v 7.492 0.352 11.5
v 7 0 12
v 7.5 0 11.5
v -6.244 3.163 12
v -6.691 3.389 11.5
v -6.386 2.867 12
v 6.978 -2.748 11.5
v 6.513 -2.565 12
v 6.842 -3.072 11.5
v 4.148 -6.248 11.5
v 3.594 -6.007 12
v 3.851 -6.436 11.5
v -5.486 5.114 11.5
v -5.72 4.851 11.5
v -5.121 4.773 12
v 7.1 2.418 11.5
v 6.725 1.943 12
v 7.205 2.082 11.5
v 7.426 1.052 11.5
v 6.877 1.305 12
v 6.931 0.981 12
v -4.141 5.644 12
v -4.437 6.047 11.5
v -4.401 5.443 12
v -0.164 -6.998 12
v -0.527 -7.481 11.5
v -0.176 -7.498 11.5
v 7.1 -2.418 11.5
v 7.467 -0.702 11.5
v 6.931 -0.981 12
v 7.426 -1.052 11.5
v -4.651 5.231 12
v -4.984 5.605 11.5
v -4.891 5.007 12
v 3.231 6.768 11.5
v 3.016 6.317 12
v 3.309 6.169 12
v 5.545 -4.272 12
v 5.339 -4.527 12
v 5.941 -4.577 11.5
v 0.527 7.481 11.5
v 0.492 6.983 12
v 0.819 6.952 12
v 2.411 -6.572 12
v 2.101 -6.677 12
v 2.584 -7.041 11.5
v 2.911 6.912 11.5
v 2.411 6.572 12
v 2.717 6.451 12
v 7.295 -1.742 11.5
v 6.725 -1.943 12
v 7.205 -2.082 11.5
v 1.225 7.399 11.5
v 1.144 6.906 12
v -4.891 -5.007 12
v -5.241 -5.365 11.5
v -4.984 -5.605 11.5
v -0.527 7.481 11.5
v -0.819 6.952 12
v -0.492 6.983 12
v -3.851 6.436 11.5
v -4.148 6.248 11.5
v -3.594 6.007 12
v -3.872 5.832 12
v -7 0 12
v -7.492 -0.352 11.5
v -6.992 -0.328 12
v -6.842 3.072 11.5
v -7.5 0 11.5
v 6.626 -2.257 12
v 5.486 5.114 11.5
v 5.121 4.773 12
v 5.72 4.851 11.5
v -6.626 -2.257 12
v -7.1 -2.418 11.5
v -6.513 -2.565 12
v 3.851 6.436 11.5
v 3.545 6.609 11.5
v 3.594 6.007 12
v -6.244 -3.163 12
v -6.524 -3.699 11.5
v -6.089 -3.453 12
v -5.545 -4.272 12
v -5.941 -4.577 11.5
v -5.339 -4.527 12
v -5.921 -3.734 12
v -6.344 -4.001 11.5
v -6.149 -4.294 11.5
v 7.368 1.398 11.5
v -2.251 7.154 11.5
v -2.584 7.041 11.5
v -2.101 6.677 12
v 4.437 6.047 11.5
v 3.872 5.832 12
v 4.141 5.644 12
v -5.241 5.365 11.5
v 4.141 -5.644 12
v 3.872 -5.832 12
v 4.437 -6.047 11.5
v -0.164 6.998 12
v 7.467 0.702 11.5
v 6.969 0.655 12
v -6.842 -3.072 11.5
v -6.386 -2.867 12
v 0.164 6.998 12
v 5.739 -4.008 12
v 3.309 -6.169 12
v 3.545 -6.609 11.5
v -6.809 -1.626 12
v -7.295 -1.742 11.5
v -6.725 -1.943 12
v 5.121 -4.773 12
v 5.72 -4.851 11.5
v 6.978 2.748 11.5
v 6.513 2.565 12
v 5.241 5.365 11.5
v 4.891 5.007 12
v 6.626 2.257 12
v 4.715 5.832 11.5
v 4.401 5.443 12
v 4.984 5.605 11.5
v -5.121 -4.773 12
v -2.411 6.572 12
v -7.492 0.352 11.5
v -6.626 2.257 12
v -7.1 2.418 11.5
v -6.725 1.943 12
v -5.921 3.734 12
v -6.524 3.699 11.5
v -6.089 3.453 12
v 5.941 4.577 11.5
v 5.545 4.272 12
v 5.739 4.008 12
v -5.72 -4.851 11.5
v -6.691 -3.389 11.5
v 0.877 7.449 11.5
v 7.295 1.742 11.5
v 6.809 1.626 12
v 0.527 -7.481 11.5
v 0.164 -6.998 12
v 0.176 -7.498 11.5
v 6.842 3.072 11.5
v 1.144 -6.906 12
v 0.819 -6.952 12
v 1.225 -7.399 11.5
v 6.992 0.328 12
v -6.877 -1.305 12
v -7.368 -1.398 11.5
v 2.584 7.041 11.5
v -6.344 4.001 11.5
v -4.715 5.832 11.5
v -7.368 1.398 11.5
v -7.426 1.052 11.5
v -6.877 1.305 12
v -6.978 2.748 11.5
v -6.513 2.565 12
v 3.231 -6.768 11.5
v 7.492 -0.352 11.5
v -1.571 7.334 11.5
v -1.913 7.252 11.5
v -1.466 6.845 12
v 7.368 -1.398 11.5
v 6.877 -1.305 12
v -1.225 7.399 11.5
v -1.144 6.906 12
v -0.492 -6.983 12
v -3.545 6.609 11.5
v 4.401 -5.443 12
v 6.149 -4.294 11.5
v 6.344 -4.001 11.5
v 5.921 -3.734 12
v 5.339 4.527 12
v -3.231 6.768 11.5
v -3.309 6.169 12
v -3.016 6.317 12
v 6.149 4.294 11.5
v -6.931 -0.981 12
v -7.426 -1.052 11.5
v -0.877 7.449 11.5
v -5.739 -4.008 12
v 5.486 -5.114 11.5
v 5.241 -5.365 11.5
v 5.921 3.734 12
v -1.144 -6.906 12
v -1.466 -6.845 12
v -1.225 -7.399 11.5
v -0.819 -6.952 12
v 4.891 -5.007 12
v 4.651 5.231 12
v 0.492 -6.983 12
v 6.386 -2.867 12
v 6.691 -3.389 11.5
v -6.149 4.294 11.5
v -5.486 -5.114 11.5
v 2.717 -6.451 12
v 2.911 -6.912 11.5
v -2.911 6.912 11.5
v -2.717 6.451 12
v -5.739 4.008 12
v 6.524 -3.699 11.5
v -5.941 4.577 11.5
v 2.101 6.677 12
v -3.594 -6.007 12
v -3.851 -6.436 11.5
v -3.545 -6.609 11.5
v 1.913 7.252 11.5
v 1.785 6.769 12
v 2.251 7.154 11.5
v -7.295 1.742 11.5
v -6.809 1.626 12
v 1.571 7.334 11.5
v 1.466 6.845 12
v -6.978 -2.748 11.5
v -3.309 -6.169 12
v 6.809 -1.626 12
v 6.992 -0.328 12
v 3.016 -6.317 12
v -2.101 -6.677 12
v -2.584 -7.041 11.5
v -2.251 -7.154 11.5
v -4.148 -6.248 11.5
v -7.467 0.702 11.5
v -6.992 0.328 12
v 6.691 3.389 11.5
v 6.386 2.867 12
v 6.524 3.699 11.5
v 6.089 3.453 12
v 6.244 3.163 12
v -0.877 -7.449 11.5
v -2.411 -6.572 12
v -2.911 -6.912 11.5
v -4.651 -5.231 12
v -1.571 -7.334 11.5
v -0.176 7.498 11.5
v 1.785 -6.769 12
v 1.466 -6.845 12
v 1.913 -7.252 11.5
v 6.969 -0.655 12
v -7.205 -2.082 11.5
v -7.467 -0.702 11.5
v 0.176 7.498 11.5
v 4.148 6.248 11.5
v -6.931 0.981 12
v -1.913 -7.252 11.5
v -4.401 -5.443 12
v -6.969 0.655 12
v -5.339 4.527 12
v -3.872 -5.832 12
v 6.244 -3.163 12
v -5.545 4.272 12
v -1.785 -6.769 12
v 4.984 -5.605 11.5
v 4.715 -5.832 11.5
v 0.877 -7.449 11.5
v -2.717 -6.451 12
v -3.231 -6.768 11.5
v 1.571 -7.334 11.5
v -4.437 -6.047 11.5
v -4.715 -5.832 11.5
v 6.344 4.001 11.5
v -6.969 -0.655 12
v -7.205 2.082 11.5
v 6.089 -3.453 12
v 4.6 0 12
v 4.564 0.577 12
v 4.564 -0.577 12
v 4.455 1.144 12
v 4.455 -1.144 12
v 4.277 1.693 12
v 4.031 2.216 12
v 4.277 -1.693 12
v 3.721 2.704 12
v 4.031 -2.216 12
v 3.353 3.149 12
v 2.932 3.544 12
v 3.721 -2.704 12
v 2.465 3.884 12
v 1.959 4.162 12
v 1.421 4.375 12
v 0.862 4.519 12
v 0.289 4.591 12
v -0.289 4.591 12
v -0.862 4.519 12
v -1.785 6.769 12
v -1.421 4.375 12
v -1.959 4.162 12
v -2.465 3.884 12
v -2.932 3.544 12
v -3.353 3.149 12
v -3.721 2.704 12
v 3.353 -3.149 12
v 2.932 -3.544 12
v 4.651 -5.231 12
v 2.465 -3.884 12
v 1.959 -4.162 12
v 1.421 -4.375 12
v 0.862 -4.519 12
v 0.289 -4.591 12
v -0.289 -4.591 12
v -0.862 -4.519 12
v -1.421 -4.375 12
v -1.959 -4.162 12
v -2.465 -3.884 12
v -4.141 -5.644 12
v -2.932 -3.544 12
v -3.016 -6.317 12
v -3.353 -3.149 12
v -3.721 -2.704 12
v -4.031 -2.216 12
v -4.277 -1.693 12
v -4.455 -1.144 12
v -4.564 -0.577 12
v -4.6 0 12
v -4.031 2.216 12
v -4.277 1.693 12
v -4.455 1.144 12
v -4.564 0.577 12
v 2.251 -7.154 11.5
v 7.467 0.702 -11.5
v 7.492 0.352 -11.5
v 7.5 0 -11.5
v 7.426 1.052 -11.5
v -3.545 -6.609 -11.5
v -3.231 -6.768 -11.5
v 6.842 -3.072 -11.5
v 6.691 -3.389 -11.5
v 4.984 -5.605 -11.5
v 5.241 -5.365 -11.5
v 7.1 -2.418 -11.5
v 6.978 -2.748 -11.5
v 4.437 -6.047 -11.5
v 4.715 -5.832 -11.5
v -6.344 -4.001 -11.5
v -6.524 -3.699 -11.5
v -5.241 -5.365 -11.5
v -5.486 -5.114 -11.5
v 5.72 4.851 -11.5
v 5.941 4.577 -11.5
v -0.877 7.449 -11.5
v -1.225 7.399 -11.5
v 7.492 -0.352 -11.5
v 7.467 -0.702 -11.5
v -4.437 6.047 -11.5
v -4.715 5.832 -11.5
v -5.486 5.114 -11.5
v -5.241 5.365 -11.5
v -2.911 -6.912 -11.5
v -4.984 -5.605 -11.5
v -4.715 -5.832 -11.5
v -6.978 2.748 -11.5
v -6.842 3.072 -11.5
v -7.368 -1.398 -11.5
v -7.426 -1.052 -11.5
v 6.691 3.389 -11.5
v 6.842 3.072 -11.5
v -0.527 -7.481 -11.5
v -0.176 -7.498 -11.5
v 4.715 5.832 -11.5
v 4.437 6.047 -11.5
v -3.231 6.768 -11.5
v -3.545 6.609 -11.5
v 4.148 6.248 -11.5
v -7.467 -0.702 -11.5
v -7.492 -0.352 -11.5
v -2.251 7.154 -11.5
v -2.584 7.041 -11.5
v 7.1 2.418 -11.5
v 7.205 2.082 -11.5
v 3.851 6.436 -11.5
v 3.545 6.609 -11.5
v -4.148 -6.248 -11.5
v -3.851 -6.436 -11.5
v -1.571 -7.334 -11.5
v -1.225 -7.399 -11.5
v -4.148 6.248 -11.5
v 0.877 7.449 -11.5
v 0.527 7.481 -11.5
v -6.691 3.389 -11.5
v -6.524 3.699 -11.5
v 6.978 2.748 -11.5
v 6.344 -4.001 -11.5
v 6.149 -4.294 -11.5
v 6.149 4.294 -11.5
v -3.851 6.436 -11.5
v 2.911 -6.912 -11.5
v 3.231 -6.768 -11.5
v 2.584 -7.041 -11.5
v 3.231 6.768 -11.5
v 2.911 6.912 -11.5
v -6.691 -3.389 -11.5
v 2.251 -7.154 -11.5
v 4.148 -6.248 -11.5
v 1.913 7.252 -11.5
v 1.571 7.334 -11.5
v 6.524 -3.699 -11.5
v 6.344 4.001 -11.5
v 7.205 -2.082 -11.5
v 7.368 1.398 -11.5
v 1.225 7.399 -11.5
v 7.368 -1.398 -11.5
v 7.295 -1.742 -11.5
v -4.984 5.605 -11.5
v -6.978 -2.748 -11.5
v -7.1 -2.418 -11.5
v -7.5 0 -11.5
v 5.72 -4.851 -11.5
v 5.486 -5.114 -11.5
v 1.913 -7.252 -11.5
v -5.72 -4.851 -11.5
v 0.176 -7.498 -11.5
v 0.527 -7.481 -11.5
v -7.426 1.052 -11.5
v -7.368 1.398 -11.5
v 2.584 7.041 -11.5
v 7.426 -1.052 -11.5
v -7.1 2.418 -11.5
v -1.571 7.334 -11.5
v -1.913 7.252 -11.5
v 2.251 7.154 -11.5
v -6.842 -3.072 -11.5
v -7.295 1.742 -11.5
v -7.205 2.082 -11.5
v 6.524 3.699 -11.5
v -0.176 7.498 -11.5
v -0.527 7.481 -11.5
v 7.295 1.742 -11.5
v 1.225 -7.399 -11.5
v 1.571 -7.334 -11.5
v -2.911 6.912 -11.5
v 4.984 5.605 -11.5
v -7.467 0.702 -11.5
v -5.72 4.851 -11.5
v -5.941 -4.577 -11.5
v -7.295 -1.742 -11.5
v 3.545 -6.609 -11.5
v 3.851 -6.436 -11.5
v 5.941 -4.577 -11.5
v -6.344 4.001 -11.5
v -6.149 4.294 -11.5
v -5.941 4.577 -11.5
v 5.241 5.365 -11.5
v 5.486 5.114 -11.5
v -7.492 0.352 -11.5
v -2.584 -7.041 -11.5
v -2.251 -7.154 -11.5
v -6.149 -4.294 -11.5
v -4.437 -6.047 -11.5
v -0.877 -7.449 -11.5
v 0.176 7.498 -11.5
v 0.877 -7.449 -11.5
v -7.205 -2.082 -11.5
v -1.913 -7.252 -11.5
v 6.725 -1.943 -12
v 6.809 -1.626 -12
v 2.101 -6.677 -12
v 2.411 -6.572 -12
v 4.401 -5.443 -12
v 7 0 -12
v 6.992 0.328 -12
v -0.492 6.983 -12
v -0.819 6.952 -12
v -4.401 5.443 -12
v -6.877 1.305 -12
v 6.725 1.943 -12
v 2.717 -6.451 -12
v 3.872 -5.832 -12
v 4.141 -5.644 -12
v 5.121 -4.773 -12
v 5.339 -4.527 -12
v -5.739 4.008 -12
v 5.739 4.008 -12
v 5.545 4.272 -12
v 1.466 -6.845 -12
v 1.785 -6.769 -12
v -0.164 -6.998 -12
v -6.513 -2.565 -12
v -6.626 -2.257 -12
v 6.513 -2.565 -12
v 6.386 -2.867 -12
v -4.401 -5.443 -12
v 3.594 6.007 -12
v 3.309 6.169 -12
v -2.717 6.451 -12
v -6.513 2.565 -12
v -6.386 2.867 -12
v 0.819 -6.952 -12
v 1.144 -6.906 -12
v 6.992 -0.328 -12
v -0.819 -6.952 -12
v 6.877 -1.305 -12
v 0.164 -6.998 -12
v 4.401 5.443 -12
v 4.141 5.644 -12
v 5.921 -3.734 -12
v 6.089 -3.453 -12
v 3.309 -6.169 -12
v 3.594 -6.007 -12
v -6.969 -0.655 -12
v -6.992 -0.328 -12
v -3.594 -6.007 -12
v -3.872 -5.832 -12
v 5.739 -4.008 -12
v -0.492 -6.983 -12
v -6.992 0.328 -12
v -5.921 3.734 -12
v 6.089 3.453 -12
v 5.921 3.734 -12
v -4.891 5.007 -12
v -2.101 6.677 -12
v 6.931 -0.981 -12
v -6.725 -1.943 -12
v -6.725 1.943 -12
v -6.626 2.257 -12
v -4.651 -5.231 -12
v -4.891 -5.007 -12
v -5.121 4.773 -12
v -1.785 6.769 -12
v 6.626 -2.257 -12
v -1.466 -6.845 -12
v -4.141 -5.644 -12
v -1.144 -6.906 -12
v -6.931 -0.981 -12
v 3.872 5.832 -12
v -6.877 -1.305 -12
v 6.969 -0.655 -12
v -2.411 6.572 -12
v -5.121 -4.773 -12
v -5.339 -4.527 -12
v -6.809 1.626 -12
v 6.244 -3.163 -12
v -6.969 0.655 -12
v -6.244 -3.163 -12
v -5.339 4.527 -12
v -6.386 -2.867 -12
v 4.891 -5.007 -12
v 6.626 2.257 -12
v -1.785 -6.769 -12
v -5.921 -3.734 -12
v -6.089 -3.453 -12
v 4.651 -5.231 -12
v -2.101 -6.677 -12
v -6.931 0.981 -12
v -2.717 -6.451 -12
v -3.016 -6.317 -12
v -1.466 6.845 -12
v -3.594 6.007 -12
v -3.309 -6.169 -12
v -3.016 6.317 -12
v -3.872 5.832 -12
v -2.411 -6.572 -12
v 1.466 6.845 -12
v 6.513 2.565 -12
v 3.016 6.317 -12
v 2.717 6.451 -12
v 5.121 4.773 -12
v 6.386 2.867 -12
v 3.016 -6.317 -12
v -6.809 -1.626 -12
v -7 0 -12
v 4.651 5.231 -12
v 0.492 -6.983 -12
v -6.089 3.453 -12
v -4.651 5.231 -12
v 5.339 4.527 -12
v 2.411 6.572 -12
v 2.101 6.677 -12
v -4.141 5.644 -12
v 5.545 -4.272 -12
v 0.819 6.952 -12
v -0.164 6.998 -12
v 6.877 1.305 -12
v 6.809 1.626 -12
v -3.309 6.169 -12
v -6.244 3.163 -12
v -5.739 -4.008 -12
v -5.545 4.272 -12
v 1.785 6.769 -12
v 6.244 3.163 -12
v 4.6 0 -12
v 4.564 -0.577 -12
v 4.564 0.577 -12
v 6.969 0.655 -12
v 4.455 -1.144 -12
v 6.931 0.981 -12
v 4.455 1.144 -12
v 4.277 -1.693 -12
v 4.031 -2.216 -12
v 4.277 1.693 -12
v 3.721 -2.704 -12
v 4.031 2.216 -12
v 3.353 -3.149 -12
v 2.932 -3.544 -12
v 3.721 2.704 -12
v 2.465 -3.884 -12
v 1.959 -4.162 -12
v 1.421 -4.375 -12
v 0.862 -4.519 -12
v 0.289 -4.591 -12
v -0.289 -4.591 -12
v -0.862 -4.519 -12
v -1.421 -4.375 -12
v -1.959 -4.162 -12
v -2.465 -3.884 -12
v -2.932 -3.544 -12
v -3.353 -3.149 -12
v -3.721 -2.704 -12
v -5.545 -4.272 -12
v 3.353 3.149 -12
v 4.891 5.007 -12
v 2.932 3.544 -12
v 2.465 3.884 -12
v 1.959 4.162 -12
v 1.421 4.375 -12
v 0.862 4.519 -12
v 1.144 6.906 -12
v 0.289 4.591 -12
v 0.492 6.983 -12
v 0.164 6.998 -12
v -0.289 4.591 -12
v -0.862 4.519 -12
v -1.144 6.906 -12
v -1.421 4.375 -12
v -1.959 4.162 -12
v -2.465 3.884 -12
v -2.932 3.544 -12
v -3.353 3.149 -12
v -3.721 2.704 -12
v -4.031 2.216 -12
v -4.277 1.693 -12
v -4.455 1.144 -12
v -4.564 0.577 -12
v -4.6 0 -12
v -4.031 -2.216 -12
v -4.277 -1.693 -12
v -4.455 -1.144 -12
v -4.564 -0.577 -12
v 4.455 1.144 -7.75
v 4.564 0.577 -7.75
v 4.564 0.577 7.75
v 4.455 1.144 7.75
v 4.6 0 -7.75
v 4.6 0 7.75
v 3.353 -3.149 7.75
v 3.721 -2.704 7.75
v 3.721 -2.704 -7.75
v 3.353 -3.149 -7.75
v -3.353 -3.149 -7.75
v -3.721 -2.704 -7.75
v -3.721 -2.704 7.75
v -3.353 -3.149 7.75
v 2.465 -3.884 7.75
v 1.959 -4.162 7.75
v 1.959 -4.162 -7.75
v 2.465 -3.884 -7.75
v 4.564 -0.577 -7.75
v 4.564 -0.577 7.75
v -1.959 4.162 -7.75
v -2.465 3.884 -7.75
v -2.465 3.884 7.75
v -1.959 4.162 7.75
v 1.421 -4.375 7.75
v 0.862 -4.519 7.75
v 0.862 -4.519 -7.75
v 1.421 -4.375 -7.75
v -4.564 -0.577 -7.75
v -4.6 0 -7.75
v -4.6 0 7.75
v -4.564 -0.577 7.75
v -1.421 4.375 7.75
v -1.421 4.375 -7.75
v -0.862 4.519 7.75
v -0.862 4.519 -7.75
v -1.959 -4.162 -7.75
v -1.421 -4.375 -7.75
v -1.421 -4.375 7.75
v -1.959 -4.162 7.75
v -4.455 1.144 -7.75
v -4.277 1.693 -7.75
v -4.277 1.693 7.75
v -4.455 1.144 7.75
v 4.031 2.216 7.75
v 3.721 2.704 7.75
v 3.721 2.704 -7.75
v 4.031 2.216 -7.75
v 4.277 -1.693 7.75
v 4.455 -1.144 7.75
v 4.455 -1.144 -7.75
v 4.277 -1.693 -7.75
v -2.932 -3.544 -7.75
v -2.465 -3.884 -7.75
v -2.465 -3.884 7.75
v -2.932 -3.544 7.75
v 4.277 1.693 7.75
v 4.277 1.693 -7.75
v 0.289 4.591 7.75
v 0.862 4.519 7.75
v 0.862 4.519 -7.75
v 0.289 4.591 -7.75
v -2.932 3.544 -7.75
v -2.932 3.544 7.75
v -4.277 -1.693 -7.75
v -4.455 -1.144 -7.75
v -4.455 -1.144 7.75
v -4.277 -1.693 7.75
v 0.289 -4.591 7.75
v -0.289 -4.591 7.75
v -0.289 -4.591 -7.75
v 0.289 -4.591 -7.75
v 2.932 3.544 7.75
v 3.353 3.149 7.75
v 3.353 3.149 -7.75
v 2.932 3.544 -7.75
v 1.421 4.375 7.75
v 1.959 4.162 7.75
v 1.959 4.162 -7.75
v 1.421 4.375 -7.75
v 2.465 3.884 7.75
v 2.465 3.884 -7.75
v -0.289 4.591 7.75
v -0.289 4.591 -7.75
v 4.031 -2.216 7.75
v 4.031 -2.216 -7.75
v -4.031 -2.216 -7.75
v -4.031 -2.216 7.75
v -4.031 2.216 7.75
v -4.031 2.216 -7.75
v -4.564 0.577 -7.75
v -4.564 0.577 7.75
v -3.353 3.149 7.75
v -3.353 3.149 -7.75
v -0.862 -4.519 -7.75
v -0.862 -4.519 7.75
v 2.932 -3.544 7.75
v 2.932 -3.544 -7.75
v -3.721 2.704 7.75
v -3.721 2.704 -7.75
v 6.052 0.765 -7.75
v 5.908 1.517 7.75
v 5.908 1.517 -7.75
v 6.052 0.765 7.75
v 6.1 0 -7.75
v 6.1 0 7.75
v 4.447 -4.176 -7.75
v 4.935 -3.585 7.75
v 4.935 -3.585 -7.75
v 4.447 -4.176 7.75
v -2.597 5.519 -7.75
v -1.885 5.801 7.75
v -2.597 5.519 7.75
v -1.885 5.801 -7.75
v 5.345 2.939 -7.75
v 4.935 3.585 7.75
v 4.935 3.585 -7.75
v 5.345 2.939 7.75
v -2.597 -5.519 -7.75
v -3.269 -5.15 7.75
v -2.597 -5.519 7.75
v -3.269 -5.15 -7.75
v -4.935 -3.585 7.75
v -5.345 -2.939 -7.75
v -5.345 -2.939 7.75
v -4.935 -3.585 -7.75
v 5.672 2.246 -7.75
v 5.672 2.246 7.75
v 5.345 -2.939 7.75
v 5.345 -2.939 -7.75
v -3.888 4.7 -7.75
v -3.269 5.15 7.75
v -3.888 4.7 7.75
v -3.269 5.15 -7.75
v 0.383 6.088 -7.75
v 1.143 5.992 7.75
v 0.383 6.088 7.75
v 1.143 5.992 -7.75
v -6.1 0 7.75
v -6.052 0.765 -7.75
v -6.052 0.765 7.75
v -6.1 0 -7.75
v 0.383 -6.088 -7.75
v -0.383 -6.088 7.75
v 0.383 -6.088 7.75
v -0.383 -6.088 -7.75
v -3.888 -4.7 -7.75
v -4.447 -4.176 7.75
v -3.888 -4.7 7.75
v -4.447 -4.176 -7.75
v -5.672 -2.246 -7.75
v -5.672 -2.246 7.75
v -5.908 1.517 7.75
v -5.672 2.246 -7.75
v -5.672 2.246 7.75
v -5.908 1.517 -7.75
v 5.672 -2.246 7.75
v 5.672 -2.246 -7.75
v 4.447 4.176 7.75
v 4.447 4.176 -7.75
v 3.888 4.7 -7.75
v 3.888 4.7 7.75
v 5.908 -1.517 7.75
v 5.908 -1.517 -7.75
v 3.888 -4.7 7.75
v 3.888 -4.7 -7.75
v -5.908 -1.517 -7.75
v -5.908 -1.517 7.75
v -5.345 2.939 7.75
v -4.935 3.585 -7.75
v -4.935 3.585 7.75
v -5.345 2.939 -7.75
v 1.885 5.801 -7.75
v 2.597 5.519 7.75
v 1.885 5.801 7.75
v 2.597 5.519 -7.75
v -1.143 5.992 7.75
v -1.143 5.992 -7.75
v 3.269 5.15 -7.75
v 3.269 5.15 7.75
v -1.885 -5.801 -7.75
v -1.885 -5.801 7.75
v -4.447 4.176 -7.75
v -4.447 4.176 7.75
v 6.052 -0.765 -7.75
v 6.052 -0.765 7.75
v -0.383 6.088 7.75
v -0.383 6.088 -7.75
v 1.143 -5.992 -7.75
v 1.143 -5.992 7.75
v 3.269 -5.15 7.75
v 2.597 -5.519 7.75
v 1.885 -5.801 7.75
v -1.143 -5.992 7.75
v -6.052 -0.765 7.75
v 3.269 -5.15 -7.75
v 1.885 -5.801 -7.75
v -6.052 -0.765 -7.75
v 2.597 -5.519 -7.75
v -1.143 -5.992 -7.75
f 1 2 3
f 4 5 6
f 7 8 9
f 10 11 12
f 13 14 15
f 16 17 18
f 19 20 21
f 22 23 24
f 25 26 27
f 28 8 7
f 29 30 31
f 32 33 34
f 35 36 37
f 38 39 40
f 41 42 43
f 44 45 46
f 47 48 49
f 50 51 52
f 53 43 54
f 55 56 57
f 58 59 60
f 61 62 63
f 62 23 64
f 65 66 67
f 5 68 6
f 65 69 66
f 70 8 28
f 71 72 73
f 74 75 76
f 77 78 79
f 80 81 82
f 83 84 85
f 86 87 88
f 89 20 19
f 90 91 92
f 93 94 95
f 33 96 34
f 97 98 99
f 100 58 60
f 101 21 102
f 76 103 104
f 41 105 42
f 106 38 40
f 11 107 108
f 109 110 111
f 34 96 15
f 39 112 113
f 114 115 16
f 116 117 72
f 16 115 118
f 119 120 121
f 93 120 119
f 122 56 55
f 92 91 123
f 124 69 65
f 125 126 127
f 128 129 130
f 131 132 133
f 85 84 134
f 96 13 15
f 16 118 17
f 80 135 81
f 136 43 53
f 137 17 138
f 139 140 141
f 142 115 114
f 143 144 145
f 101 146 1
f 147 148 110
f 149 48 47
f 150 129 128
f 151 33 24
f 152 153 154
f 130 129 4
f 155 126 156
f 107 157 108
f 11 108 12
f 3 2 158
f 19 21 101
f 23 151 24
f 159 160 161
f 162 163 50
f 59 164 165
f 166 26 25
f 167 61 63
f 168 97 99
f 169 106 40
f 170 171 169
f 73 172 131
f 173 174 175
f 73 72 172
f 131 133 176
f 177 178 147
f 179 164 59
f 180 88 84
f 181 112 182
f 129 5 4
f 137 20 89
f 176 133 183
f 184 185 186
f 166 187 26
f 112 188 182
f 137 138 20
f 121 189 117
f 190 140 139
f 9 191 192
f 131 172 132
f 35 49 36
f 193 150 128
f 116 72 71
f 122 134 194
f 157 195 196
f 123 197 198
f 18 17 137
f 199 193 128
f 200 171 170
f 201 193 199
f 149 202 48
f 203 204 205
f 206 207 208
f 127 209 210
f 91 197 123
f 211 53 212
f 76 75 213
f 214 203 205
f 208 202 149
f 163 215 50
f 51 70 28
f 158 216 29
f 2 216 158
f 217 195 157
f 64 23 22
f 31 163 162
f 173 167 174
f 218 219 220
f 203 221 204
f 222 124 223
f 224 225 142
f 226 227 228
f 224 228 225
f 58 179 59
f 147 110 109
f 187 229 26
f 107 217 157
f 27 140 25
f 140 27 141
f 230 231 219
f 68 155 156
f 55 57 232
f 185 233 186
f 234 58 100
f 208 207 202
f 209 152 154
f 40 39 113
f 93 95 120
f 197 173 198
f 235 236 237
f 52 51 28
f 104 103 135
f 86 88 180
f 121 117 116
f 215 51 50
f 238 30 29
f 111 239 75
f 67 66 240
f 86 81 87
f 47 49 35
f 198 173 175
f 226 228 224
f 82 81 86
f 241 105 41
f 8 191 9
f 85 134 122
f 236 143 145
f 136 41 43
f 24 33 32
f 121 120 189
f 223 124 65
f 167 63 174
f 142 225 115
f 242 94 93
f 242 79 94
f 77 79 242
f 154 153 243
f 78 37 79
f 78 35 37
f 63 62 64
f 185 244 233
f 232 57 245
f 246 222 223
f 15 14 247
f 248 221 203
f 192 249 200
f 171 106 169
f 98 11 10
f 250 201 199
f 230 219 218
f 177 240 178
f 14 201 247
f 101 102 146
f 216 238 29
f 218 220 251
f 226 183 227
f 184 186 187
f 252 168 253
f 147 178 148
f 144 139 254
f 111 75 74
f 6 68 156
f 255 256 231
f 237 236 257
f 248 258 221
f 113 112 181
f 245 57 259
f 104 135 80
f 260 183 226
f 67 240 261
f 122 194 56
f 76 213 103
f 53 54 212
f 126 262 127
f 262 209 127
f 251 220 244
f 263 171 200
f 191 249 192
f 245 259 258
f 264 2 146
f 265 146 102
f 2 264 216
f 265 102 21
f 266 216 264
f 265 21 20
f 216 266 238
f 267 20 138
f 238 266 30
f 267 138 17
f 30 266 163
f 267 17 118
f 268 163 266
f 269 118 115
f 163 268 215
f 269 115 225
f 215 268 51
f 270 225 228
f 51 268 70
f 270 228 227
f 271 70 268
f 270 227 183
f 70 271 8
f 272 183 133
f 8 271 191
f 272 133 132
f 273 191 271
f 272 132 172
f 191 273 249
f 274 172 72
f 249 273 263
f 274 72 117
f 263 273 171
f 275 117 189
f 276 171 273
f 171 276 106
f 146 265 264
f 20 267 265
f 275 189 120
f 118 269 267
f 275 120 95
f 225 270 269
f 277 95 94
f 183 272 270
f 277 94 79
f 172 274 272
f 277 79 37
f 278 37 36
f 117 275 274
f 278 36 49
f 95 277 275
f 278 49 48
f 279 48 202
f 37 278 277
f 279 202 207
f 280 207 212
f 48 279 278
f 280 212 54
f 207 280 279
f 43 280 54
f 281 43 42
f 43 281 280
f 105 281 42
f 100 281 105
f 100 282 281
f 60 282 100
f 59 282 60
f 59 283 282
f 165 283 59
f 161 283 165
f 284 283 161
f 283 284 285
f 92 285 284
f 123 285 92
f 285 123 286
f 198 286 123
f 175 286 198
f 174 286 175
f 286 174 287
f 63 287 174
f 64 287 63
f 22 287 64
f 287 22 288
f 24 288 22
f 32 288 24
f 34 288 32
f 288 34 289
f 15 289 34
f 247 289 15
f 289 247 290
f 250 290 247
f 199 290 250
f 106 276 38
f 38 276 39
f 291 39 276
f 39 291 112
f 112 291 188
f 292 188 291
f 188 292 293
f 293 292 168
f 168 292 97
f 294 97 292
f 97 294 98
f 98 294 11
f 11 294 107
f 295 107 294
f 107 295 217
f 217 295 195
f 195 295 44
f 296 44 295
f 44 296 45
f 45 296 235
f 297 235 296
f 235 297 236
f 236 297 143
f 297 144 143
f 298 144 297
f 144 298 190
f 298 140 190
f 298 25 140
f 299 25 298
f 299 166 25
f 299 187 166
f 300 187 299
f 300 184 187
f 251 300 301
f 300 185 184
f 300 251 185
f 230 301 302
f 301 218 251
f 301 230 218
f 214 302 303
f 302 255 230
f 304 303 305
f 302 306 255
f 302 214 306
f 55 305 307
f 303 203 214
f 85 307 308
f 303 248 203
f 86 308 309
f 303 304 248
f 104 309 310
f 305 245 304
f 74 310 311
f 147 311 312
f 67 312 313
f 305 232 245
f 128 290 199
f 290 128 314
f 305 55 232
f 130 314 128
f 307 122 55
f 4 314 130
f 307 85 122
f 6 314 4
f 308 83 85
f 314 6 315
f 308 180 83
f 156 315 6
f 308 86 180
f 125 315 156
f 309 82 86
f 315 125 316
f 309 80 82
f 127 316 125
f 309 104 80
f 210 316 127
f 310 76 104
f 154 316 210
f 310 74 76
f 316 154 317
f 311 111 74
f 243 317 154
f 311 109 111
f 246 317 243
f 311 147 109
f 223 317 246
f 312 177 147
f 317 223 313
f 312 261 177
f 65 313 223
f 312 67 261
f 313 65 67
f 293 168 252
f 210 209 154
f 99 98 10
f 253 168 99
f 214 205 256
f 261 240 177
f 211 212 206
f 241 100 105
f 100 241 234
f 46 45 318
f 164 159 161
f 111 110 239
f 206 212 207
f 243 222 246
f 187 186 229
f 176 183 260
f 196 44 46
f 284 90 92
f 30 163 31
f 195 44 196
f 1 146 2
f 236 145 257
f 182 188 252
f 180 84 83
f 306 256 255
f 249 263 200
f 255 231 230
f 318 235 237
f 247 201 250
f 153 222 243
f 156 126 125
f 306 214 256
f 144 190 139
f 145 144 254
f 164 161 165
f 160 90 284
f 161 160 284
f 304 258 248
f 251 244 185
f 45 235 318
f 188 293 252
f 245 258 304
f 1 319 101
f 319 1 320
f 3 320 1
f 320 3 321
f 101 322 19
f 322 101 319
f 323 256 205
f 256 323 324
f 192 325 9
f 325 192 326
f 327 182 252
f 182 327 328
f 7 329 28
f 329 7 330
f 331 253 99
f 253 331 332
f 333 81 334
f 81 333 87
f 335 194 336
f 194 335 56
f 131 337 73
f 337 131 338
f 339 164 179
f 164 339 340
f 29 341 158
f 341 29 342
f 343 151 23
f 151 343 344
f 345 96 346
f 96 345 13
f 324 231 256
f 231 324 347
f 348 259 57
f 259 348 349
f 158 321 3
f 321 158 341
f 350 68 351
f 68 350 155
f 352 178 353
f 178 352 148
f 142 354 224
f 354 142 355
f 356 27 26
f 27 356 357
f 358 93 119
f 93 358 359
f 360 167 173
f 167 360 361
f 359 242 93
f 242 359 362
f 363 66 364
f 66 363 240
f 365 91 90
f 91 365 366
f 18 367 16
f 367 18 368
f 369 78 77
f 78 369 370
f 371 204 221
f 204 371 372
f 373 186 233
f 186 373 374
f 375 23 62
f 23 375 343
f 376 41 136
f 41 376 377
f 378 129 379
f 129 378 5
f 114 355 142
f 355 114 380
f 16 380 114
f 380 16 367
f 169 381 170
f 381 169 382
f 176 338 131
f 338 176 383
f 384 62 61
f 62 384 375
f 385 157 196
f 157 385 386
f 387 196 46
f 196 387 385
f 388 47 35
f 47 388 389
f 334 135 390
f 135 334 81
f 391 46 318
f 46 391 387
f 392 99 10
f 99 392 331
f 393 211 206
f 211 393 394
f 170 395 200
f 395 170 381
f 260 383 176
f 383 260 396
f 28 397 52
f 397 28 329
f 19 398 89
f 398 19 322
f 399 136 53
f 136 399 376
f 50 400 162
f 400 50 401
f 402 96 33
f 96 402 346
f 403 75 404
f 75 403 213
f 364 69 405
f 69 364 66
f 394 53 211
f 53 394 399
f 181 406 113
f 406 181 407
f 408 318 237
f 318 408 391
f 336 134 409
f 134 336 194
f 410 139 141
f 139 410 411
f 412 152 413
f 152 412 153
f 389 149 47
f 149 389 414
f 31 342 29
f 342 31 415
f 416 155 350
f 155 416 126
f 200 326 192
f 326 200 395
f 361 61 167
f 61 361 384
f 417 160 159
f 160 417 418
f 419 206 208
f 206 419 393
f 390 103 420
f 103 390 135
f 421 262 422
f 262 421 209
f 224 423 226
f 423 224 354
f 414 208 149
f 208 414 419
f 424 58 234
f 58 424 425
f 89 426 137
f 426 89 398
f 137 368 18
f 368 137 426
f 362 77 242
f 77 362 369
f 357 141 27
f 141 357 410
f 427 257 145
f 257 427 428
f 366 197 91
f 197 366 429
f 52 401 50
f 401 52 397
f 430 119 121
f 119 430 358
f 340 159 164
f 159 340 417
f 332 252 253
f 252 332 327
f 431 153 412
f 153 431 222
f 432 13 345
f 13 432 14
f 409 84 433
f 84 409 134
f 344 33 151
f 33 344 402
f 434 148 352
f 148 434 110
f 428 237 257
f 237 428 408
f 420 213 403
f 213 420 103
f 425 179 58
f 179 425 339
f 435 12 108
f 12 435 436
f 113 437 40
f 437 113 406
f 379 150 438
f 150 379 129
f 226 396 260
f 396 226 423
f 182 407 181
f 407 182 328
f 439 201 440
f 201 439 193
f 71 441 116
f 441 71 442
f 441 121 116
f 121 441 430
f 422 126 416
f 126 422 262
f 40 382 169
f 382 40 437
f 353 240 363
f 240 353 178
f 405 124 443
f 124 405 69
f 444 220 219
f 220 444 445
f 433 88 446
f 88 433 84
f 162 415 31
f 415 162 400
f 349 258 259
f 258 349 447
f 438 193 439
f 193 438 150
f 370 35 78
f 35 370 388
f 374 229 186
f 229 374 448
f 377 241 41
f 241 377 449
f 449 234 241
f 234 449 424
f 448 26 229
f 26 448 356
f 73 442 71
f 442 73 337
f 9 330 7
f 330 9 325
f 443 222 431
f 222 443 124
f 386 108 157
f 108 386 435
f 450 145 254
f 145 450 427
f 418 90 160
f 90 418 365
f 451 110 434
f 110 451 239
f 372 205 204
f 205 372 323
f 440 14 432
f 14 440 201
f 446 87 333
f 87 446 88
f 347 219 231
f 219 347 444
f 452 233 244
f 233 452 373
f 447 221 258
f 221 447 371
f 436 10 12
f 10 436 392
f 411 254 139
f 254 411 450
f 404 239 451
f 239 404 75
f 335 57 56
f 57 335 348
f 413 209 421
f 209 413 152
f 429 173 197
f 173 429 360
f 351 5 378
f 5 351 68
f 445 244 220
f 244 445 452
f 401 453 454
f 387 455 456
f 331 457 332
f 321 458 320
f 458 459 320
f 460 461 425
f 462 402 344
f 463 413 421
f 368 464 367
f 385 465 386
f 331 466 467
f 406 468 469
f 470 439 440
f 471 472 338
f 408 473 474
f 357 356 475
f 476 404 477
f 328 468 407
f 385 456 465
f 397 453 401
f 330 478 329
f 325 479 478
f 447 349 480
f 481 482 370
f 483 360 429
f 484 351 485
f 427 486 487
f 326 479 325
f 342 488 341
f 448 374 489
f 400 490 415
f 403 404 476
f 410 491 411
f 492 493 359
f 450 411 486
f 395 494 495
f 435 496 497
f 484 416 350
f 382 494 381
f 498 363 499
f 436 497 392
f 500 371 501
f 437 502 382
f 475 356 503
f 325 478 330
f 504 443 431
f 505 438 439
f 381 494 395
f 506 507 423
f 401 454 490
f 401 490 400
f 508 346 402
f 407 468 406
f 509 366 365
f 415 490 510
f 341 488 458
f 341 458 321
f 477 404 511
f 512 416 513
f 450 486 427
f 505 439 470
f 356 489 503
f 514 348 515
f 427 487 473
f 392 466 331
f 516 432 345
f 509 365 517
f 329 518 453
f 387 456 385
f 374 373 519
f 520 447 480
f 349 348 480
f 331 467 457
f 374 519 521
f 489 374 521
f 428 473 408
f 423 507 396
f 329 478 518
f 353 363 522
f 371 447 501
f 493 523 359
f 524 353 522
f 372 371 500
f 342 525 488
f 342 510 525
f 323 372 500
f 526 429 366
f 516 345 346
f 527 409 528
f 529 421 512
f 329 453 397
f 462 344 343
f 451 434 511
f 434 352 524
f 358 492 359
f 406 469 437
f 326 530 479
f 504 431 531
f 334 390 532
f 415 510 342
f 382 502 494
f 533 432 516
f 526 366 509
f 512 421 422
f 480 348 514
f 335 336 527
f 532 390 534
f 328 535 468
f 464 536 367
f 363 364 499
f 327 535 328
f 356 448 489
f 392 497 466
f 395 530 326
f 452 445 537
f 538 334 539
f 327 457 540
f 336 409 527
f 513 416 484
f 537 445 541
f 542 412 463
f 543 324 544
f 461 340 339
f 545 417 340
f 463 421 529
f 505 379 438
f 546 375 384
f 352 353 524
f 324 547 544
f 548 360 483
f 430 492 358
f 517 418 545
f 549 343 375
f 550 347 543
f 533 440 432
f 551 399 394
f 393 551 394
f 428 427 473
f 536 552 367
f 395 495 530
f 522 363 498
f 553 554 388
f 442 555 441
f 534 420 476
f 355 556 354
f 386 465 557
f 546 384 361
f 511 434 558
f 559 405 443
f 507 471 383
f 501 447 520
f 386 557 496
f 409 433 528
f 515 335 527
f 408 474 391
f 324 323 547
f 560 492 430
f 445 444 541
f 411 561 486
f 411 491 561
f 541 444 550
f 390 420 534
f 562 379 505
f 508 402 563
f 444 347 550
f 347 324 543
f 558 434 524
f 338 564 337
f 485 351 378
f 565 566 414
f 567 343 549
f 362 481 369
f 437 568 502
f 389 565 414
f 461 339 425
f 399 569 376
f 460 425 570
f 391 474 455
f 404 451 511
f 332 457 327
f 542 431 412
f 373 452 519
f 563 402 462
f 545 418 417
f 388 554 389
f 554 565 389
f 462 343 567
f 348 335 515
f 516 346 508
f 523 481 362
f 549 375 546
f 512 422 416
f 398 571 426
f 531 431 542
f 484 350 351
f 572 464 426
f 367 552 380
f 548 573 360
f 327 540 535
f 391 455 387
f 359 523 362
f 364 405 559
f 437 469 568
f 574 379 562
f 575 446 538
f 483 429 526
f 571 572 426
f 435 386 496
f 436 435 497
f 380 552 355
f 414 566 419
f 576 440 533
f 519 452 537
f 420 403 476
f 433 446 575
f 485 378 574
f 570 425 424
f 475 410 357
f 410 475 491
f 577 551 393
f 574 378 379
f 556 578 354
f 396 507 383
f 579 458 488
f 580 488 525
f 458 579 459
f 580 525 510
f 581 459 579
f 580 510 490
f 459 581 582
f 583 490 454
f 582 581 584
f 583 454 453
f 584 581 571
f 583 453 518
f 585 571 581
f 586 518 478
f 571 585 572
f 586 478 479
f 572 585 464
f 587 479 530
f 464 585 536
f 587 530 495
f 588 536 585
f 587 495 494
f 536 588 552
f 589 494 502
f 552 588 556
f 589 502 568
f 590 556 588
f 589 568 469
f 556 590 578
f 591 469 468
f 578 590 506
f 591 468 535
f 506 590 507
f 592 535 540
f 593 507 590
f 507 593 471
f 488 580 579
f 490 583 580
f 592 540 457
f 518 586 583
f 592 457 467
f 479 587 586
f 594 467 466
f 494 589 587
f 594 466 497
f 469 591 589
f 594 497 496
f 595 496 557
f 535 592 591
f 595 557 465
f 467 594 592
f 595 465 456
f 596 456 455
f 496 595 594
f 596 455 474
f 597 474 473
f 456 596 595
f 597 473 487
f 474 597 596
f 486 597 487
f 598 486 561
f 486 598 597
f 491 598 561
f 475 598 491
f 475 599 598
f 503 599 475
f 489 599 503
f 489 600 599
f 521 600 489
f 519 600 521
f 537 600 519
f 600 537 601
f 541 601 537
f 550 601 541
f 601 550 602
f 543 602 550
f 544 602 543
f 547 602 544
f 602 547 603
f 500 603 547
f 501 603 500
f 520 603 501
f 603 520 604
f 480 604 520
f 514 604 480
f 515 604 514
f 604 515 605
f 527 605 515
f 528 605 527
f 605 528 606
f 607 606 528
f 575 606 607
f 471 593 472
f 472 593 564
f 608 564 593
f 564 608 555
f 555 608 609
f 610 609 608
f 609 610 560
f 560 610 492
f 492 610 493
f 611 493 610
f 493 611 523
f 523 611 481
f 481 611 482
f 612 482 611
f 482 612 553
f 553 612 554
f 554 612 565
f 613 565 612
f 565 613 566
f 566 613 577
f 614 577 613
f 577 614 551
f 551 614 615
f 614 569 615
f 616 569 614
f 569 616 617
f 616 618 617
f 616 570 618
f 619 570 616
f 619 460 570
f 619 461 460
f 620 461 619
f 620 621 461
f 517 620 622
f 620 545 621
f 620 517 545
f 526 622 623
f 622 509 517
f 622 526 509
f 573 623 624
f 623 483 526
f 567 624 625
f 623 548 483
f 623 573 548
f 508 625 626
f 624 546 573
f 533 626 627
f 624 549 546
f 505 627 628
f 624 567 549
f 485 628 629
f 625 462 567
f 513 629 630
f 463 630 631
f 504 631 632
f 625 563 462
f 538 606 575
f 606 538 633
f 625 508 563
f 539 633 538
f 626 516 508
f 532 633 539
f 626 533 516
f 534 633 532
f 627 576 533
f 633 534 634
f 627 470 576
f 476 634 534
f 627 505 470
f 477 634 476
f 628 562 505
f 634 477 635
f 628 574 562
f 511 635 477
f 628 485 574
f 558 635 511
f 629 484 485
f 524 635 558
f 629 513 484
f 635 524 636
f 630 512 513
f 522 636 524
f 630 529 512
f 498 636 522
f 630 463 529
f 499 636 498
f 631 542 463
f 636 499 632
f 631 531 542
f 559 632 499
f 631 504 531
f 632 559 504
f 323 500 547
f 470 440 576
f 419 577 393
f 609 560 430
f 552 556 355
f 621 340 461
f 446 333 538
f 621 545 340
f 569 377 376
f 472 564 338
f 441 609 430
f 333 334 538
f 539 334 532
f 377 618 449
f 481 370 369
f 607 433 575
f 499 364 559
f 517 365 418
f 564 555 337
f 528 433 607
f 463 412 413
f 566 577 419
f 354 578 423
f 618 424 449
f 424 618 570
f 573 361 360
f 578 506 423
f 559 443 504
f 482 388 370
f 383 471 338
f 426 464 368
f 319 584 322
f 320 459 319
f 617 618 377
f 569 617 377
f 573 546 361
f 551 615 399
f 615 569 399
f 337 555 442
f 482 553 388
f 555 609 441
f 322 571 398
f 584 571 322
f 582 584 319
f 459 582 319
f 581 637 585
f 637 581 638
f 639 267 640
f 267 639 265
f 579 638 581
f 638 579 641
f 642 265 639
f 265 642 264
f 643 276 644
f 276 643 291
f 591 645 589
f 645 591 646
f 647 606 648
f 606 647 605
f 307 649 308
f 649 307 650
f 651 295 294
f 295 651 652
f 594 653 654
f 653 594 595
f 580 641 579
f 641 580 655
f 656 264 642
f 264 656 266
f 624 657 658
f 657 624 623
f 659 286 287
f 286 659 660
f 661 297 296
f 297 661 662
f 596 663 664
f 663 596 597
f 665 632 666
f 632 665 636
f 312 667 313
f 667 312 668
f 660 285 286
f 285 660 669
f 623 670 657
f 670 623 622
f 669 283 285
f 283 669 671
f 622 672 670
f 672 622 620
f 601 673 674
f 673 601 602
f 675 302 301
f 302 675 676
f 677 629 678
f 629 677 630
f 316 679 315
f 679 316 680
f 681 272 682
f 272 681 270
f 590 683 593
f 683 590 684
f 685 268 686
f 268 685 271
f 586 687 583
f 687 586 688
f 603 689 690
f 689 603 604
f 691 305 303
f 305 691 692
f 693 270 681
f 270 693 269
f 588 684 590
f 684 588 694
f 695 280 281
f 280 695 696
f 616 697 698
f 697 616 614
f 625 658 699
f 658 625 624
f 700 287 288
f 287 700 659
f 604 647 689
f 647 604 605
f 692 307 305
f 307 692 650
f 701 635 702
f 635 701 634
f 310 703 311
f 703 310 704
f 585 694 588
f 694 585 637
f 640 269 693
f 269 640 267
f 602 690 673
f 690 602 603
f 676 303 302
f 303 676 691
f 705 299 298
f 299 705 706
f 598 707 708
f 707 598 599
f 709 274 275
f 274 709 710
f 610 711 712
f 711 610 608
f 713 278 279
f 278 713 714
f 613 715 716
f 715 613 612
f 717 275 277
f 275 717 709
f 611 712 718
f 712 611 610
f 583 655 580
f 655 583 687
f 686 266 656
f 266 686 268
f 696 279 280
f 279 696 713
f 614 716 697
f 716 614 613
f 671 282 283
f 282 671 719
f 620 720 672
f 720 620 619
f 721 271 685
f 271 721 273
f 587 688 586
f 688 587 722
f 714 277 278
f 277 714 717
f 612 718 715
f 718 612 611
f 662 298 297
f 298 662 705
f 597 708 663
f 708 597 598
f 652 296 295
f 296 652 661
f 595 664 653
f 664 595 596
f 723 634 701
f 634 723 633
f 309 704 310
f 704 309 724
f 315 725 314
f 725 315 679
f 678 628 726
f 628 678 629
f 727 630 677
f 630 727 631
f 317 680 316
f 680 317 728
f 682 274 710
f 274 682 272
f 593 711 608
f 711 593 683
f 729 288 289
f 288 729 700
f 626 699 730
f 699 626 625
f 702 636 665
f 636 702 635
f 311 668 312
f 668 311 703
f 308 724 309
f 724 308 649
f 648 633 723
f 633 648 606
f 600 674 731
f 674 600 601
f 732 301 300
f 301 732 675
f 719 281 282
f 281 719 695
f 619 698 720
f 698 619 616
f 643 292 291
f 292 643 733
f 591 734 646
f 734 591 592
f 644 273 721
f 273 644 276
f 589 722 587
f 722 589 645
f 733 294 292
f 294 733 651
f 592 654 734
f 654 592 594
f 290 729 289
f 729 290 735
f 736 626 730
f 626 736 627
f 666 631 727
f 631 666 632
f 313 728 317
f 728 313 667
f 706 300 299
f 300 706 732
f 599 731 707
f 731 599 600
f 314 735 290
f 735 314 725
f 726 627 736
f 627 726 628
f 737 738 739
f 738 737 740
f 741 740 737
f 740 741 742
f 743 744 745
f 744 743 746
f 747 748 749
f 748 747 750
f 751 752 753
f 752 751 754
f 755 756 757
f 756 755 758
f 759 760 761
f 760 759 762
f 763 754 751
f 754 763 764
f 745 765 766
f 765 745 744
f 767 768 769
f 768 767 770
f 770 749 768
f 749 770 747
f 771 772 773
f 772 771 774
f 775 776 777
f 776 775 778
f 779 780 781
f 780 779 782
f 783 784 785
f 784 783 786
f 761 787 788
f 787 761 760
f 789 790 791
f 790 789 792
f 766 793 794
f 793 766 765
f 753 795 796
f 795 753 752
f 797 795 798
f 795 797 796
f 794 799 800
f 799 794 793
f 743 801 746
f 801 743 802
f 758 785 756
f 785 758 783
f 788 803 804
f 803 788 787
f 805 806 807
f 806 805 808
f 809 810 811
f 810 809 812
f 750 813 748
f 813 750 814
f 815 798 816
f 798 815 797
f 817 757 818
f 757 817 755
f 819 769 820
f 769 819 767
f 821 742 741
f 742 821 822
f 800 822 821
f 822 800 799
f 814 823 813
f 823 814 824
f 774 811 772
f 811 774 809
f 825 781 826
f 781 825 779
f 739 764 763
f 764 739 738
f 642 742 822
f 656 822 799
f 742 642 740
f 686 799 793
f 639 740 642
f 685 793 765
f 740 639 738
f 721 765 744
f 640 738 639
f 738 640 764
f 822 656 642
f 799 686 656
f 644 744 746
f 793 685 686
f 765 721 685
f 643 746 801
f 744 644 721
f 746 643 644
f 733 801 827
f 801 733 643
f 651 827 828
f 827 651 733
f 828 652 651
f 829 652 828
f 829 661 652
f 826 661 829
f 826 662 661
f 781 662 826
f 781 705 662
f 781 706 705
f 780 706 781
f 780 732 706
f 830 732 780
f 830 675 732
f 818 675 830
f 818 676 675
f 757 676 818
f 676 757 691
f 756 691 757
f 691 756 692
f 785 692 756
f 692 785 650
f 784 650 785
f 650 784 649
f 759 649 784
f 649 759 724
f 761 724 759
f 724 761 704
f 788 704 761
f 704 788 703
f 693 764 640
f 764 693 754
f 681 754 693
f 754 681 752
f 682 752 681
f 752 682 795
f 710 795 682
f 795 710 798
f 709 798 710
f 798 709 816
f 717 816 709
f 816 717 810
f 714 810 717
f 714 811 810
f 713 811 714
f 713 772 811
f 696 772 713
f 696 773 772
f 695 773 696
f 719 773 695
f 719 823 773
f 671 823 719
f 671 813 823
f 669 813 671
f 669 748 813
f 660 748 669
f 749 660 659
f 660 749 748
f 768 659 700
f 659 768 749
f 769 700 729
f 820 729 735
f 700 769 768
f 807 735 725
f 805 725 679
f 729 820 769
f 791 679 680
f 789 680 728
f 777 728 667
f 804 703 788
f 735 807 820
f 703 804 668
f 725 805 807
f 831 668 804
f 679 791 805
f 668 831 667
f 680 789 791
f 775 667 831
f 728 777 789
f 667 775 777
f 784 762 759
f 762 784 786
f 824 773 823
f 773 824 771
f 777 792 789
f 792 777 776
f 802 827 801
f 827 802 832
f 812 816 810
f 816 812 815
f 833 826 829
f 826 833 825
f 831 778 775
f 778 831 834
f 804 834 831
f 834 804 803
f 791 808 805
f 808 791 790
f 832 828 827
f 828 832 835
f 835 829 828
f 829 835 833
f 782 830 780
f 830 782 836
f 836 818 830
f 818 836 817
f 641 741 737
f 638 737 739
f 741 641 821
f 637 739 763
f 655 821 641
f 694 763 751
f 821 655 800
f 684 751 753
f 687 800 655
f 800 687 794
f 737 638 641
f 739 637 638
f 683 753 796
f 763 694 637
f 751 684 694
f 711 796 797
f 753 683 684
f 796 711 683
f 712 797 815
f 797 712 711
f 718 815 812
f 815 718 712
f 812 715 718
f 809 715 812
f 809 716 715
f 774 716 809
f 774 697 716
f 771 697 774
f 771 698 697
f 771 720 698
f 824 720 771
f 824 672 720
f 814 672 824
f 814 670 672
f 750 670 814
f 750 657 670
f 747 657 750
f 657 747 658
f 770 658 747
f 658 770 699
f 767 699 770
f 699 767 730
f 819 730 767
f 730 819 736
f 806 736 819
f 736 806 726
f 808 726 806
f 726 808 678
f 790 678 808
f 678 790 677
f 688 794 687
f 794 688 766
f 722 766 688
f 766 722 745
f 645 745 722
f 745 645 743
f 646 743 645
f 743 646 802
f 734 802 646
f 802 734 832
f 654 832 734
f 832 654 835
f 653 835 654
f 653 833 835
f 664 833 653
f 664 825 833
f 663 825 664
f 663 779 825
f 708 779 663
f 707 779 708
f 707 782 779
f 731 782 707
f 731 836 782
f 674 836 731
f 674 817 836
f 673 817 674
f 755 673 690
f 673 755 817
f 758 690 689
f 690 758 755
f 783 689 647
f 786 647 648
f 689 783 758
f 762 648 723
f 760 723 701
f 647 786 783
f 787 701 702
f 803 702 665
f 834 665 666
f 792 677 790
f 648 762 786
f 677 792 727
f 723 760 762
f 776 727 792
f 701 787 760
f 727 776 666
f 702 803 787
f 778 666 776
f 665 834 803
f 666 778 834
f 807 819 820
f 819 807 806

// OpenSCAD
/**
  * Christian Völlinger 2016
  * bushing_adapter
  */

// length of the adapter, 24mm for a lm8uu
h=24;
// length of the adapter bushing
l=15.5;
// diameter of the adapter, 15mm for a lm8uu
d=15;
// diameter of the rods + clearance
dRod=9.2;
// outer diameter of the adapted bushing, I uses 12.2
id=12.2; 

// ignore this variable!
$fn=50;




difference() {
    translate([0,0,-h/2]) chamferCylinder(h, d/2, chamferHeight = 0.5, quality = 1); 
    cylinder(h = 24, r = dRod/2, center = true);
    cylinder(h = l, r = id/2, center = true);
}


/**
  *  The MIT License (MIT)
  *
  *  "Chamfers for OpenSCAD" v0.31 Copyright (c) 2016 SebiTimeWaster
  *
  *  Permission is hereby granted, free of charge, to any person obtaining a copy
  *  of this software and associated documentation files (the "Software"), to deal
  *  in the Software without restriction, including without limitation the rights
  *  to use, copy, modify, merge, publish, distribute, sublicense, and/or sell
  *  copies of the Software, and to permit persons to whom the Software is
  *  furnished to do so, subject to the following conditions:
  *
  *  The above copyright notice and this permission notice shall be included in all
  *  copies or substantial portions of the Software.
  *
  *  THE SOFTWARE IS PROVIDED "AS IS", WITHOUT WARRANTY OF ANY KIND, EXPRESS OR
  *  IMPLIED, INCLUDING BUT NOT LIMITED TO THE WARRANTIES OF MERCHANTABILITY,
  *  FITNESS FOR A PARTICULAR PURPOSE AND NONINFRINGEMENT. IN NO EVENT SHALL THE
  *  AUTHORS OR COPYRIGHT HOLDERS BE LIABLE FOR ANY CLAIM, DAMAGES OR OTHER
  *  LIABILITY, WHETHER IN AN ACTION OF CONTRACT, TORT OR OTHERWISE, ARISING FROM,
  *  OUT OF OR IN CONNECTION WITH THE SOFTWARE OR THE USE OR OTHER DEALINGS IN THE
  *  SOFTWARE.
  */

/**

/**
  * chamferCylinder returns an cylinder or cone with 45° chamfers on
  * the edges of the cylinder. The chamfers are diectly printable on
  * Fused deposition modelling (FDM) printers without support structures.
  *
  * @param  height         Height of the cylinder
  * @param  radius         Radius of the cylinder (At the bottom)
  * @param  radius2        Radius of the cylinder (At the top)
  * @param  chamferHeight  The "height" of the chamfers as seen from
  *                        one of the dimensional planes (The real
  *                        width is side c in a right angled triangle)
  * @param  angle          The radius of the visible part of a wedge
  *                        starting from the x axis counter-clockwise
  * @param  quality        A circle quality factor where 1.0 is a fairly
  *                        good quality, range from 0.0 to 2.0
  */
module chamferCylinder(height, radius, radius2=undef, chamferHeight = 1, angle = 0, quality = -1.0) {
    radius2 = (radius2 == undef) ? radius : radius2;
    module cc() {
        if(chamferHeight != 0) {
            translate([0, 0, height - abs(chamferHeight)]) cylinder(abs(chamferHeight), r1 = radius2, r2 = radius2 - chamferHeight, $fn = circleSegments(radius2, quality));
        }
        translate([0, 0, abs(chamferHeight)]) cylinder(height - abs(chamferHeight) * 2, r1 = radius, r2 = radius2, $fn = circleSegments(max(radius, radius2), quality));
        if(chamferHeight != 0) {
            cylinder(abs(chamferHeight), r1 = radius - chamferHeight, r2 = radius, $fn = circleSegments(radius, quality));
        }
    }
    module box(brim = abs(min(chamferHeight, 0)) + 1) {
        translate([-radius - brim, 0, -brim]) cube([radius * 2 + brim * 2, radius + brim, height + brim * 2]);
    }
    module hcc() {
        intersection() {
            cc();
            box();
        }
    }
    if(angle <= 0 || angle >= 360) cc();
    else {
        if(angle > 180) hcc();
        difference() {
            if(angle <= 180) hcc();
            else rotate([0, 0, 180]) hcc();
            rotate([0, 0, angle]) box(abs(min(chamferHeight, 0)) + radius);
        }
    }
}

/**
  * circleSegments calculates the number of segments needed to maintain
  * a constant circle quality.
  * If a globalSegementsQuality variable exist it will overwrite the
  * standard quality setting (1.0). Order of usage is:
  * Standard (1.0) <- globalCircleQuality <- Quality parameter
  *
  * @param  r        Radius of the circle
  * @param  quality  A quality factor, where 1.0 is a fairly good
  *                  quality, range from 0.0 to 2.0
  *
  * @return  The number of segments for the circle
  */
function circleSegments(r, quality = -1.0) = (r * PI * 4 + 40) * ((quality >= 0.0) ? quality : globalCircleQuality);

// set global quality to 1.0, can be overridden by user
globalCircleQuality = 1.0;
